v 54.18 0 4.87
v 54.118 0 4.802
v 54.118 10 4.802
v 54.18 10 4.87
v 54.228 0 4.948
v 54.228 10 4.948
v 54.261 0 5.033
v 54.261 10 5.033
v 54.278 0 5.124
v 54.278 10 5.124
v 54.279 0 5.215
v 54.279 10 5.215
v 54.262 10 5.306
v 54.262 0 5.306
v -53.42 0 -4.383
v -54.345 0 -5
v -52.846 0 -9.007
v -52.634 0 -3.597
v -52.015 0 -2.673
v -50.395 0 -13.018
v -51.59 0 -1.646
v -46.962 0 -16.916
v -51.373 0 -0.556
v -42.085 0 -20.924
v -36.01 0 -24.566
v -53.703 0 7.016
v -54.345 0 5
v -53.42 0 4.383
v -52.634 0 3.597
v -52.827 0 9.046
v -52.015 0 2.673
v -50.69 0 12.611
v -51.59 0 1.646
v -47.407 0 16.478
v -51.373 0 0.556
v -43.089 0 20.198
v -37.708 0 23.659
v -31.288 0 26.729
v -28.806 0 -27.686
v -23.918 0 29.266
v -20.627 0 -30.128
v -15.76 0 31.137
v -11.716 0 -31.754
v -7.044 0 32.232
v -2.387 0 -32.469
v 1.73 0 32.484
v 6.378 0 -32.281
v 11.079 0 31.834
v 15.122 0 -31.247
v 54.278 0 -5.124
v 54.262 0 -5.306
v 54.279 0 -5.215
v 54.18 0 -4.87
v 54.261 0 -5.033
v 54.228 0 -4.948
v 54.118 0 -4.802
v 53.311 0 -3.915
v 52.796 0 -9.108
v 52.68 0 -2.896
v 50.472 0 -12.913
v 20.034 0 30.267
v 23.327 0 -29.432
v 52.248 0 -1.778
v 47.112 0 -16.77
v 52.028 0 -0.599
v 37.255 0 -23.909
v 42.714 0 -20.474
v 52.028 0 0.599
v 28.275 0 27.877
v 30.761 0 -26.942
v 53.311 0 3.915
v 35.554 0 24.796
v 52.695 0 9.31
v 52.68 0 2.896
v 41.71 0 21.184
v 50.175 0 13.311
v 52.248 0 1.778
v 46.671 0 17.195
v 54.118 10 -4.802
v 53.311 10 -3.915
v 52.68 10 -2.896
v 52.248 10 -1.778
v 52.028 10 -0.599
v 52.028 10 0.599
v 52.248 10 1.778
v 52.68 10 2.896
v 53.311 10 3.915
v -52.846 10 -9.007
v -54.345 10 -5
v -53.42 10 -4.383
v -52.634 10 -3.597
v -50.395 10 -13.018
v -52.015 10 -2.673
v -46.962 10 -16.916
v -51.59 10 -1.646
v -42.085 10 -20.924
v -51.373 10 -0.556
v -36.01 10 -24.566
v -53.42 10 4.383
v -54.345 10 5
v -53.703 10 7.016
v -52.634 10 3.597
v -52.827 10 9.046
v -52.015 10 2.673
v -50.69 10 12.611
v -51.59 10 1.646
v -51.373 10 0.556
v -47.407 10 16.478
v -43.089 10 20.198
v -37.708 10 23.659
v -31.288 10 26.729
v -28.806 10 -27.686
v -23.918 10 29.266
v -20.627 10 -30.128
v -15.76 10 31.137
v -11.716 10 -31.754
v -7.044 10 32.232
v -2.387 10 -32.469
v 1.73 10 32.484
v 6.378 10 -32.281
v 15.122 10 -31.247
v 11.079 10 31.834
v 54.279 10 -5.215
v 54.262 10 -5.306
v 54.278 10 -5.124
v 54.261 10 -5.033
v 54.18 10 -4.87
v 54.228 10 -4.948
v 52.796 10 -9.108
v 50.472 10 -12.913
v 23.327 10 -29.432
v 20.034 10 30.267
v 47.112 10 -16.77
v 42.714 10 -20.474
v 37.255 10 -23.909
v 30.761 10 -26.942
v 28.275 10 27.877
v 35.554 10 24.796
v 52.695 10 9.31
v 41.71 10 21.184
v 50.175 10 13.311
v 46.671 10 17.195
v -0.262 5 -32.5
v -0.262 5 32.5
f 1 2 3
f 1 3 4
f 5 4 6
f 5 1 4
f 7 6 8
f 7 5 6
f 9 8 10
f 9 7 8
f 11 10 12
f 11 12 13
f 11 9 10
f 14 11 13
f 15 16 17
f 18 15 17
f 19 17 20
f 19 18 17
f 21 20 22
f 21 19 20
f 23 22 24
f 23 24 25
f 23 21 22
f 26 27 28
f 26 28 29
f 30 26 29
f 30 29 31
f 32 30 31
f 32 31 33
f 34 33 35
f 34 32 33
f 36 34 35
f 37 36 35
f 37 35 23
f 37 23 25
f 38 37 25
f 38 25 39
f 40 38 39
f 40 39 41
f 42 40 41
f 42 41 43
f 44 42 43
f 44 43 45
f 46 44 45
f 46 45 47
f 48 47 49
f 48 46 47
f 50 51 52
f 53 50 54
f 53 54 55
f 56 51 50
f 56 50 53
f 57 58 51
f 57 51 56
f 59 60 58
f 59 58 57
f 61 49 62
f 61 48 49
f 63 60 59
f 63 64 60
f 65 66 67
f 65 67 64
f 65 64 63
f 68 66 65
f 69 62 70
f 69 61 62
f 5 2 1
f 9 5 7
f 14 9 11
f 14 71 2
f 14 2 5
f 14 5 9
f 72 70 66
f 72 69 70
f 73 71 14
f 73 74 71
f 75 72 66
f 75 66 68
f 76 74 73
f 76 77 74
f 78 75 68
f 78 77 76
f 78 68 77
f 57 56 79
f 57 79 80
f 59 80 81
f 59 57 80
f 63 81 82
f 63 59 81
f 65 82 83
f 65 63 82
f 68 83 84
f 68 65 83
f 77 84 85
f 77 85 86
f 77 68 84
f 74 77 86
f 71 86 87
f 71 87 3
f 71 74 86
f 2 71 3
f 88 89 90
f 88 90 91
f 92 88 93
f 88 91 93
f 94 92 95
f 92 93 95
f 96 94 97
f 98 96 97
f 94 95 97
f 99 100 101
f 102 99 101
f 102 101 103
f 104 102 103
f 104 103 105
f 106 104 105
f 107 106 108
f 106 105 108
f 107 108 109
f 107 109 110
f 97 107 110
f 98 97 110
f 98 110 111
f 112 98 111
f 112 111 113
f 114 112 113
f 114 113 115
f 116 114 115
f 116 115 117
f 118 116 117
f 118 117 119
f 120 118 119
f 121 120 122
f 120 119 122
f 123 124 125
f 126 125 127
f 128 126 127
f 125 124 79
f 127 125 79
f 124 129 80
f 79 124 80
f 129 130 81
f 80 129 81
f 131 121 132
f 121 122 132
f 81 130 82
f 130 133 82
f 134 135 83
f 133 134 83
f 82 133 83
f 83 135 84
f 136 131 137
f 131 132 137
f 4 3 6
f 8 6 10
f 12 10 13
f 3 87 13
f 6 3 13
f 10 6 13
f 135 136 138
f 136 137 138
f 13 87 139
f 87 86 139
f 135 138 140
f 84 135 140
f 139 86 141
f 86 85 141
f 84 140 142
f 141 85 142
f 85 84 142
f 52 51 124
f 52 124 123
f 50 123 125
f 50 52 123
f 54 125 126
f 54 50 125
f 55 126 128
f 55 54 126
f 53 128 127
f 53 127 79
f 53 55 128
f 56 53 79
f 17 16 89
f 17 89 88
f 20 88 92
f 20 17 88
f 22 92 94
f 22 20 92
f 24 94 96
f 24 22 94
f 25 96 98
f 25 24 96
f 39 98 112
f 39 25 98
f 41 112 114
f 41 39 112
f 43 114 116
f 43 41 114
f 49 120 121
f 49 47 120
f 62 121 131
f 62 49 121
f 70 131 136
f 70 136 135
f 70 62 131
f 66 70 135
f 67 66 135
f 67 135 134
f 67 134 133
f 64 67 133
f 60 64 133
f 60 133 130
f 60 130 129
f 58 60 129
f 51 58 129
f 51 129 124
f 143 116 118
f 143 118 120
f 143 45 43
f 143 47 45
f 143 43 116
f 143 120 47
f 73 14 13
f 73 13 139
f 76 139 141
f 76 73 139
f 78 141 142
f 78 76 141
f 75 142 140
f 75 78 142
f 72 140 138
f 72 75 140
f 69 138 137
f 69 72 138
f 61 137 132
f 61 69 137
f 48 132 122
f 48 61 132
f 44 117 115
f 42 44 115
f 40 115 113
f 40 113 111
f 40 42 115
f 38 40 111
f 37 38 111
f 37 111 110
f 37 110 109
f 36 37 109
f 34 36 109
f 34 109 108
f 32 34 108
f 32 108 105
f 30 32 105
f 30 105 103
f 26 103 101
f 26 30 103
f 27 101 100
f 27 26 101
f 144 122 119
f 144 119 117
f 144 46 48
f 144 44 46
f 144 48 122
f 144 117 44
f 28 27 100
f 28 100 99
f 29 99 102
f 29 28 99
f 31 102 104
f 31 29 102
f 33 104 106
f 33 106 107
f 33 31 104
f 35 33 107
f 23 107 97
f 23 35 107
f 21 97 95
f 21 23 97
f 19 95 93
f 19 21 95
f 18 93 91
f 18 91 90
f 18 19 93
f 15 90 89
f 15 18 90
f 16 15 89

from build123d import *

# Parameters (mm, degrees)
F1_DEPTH = 10


with BuildPart() as f1:
    # F0 (on Front) → F1 (new body)
    with BuildSketch(Plane.XZ):
        with BuildLine():
            ThreePointArc((54.117780805, 4.8017921968), (54.2613071615, 5.0333847163), (54.2620989329, 5.3058444072))
            add(Edge.make_bspline(
                [(54.2620989329, 5.3058444072), (46.6098488239, 32.6316250563), (-0.2621069626, 32.499630948), (-47.134062749, 32.3676368396), (-54.3452147559, 5)],
                knots=[0.1639907968, 0.1639907968, 0.1639907968, 1.575561926, 1.575561926, 2.9871330551, 2.9871330551, 2.9871330551], degree=2, weights=[1, 0.7611022444, 1, 0.7611022444, 1]))
            ThreePointArc((-54.3452147559, 5), (-51.3452147559, 0), (-54.3452147559, -5))
            add(Edge.make_bspline(
                [(-54.3452147559, -5), (-47.134062749, -32.3676368396), (-0.2621069626, -32.499630948), (46.6098488239, -32.6316250563), (54.2620989329, -5.3058444072)],
                knots=[3.2960522521, 3.2960522521, 3.2960522521, 4.7076233812, 4.7076233812, 6.1191945103, 6.1191945103, 6.1191945103], degree=2, weights=[1, 0.7611022444, 1, 0.7611022444, 1]))
            ThreePointArc((54.2620989329, -5.3058444072), (54.2613071615, -5.0333847163), (54.117780805, -4.8017921968))
            ThreePointArc((54.117780805, -4.8017921968), (52, 0), (54.117780805, 4.8017921968))
        make_face()
    extrude(amount=-F1_DEPTH)


solid = f1.part
